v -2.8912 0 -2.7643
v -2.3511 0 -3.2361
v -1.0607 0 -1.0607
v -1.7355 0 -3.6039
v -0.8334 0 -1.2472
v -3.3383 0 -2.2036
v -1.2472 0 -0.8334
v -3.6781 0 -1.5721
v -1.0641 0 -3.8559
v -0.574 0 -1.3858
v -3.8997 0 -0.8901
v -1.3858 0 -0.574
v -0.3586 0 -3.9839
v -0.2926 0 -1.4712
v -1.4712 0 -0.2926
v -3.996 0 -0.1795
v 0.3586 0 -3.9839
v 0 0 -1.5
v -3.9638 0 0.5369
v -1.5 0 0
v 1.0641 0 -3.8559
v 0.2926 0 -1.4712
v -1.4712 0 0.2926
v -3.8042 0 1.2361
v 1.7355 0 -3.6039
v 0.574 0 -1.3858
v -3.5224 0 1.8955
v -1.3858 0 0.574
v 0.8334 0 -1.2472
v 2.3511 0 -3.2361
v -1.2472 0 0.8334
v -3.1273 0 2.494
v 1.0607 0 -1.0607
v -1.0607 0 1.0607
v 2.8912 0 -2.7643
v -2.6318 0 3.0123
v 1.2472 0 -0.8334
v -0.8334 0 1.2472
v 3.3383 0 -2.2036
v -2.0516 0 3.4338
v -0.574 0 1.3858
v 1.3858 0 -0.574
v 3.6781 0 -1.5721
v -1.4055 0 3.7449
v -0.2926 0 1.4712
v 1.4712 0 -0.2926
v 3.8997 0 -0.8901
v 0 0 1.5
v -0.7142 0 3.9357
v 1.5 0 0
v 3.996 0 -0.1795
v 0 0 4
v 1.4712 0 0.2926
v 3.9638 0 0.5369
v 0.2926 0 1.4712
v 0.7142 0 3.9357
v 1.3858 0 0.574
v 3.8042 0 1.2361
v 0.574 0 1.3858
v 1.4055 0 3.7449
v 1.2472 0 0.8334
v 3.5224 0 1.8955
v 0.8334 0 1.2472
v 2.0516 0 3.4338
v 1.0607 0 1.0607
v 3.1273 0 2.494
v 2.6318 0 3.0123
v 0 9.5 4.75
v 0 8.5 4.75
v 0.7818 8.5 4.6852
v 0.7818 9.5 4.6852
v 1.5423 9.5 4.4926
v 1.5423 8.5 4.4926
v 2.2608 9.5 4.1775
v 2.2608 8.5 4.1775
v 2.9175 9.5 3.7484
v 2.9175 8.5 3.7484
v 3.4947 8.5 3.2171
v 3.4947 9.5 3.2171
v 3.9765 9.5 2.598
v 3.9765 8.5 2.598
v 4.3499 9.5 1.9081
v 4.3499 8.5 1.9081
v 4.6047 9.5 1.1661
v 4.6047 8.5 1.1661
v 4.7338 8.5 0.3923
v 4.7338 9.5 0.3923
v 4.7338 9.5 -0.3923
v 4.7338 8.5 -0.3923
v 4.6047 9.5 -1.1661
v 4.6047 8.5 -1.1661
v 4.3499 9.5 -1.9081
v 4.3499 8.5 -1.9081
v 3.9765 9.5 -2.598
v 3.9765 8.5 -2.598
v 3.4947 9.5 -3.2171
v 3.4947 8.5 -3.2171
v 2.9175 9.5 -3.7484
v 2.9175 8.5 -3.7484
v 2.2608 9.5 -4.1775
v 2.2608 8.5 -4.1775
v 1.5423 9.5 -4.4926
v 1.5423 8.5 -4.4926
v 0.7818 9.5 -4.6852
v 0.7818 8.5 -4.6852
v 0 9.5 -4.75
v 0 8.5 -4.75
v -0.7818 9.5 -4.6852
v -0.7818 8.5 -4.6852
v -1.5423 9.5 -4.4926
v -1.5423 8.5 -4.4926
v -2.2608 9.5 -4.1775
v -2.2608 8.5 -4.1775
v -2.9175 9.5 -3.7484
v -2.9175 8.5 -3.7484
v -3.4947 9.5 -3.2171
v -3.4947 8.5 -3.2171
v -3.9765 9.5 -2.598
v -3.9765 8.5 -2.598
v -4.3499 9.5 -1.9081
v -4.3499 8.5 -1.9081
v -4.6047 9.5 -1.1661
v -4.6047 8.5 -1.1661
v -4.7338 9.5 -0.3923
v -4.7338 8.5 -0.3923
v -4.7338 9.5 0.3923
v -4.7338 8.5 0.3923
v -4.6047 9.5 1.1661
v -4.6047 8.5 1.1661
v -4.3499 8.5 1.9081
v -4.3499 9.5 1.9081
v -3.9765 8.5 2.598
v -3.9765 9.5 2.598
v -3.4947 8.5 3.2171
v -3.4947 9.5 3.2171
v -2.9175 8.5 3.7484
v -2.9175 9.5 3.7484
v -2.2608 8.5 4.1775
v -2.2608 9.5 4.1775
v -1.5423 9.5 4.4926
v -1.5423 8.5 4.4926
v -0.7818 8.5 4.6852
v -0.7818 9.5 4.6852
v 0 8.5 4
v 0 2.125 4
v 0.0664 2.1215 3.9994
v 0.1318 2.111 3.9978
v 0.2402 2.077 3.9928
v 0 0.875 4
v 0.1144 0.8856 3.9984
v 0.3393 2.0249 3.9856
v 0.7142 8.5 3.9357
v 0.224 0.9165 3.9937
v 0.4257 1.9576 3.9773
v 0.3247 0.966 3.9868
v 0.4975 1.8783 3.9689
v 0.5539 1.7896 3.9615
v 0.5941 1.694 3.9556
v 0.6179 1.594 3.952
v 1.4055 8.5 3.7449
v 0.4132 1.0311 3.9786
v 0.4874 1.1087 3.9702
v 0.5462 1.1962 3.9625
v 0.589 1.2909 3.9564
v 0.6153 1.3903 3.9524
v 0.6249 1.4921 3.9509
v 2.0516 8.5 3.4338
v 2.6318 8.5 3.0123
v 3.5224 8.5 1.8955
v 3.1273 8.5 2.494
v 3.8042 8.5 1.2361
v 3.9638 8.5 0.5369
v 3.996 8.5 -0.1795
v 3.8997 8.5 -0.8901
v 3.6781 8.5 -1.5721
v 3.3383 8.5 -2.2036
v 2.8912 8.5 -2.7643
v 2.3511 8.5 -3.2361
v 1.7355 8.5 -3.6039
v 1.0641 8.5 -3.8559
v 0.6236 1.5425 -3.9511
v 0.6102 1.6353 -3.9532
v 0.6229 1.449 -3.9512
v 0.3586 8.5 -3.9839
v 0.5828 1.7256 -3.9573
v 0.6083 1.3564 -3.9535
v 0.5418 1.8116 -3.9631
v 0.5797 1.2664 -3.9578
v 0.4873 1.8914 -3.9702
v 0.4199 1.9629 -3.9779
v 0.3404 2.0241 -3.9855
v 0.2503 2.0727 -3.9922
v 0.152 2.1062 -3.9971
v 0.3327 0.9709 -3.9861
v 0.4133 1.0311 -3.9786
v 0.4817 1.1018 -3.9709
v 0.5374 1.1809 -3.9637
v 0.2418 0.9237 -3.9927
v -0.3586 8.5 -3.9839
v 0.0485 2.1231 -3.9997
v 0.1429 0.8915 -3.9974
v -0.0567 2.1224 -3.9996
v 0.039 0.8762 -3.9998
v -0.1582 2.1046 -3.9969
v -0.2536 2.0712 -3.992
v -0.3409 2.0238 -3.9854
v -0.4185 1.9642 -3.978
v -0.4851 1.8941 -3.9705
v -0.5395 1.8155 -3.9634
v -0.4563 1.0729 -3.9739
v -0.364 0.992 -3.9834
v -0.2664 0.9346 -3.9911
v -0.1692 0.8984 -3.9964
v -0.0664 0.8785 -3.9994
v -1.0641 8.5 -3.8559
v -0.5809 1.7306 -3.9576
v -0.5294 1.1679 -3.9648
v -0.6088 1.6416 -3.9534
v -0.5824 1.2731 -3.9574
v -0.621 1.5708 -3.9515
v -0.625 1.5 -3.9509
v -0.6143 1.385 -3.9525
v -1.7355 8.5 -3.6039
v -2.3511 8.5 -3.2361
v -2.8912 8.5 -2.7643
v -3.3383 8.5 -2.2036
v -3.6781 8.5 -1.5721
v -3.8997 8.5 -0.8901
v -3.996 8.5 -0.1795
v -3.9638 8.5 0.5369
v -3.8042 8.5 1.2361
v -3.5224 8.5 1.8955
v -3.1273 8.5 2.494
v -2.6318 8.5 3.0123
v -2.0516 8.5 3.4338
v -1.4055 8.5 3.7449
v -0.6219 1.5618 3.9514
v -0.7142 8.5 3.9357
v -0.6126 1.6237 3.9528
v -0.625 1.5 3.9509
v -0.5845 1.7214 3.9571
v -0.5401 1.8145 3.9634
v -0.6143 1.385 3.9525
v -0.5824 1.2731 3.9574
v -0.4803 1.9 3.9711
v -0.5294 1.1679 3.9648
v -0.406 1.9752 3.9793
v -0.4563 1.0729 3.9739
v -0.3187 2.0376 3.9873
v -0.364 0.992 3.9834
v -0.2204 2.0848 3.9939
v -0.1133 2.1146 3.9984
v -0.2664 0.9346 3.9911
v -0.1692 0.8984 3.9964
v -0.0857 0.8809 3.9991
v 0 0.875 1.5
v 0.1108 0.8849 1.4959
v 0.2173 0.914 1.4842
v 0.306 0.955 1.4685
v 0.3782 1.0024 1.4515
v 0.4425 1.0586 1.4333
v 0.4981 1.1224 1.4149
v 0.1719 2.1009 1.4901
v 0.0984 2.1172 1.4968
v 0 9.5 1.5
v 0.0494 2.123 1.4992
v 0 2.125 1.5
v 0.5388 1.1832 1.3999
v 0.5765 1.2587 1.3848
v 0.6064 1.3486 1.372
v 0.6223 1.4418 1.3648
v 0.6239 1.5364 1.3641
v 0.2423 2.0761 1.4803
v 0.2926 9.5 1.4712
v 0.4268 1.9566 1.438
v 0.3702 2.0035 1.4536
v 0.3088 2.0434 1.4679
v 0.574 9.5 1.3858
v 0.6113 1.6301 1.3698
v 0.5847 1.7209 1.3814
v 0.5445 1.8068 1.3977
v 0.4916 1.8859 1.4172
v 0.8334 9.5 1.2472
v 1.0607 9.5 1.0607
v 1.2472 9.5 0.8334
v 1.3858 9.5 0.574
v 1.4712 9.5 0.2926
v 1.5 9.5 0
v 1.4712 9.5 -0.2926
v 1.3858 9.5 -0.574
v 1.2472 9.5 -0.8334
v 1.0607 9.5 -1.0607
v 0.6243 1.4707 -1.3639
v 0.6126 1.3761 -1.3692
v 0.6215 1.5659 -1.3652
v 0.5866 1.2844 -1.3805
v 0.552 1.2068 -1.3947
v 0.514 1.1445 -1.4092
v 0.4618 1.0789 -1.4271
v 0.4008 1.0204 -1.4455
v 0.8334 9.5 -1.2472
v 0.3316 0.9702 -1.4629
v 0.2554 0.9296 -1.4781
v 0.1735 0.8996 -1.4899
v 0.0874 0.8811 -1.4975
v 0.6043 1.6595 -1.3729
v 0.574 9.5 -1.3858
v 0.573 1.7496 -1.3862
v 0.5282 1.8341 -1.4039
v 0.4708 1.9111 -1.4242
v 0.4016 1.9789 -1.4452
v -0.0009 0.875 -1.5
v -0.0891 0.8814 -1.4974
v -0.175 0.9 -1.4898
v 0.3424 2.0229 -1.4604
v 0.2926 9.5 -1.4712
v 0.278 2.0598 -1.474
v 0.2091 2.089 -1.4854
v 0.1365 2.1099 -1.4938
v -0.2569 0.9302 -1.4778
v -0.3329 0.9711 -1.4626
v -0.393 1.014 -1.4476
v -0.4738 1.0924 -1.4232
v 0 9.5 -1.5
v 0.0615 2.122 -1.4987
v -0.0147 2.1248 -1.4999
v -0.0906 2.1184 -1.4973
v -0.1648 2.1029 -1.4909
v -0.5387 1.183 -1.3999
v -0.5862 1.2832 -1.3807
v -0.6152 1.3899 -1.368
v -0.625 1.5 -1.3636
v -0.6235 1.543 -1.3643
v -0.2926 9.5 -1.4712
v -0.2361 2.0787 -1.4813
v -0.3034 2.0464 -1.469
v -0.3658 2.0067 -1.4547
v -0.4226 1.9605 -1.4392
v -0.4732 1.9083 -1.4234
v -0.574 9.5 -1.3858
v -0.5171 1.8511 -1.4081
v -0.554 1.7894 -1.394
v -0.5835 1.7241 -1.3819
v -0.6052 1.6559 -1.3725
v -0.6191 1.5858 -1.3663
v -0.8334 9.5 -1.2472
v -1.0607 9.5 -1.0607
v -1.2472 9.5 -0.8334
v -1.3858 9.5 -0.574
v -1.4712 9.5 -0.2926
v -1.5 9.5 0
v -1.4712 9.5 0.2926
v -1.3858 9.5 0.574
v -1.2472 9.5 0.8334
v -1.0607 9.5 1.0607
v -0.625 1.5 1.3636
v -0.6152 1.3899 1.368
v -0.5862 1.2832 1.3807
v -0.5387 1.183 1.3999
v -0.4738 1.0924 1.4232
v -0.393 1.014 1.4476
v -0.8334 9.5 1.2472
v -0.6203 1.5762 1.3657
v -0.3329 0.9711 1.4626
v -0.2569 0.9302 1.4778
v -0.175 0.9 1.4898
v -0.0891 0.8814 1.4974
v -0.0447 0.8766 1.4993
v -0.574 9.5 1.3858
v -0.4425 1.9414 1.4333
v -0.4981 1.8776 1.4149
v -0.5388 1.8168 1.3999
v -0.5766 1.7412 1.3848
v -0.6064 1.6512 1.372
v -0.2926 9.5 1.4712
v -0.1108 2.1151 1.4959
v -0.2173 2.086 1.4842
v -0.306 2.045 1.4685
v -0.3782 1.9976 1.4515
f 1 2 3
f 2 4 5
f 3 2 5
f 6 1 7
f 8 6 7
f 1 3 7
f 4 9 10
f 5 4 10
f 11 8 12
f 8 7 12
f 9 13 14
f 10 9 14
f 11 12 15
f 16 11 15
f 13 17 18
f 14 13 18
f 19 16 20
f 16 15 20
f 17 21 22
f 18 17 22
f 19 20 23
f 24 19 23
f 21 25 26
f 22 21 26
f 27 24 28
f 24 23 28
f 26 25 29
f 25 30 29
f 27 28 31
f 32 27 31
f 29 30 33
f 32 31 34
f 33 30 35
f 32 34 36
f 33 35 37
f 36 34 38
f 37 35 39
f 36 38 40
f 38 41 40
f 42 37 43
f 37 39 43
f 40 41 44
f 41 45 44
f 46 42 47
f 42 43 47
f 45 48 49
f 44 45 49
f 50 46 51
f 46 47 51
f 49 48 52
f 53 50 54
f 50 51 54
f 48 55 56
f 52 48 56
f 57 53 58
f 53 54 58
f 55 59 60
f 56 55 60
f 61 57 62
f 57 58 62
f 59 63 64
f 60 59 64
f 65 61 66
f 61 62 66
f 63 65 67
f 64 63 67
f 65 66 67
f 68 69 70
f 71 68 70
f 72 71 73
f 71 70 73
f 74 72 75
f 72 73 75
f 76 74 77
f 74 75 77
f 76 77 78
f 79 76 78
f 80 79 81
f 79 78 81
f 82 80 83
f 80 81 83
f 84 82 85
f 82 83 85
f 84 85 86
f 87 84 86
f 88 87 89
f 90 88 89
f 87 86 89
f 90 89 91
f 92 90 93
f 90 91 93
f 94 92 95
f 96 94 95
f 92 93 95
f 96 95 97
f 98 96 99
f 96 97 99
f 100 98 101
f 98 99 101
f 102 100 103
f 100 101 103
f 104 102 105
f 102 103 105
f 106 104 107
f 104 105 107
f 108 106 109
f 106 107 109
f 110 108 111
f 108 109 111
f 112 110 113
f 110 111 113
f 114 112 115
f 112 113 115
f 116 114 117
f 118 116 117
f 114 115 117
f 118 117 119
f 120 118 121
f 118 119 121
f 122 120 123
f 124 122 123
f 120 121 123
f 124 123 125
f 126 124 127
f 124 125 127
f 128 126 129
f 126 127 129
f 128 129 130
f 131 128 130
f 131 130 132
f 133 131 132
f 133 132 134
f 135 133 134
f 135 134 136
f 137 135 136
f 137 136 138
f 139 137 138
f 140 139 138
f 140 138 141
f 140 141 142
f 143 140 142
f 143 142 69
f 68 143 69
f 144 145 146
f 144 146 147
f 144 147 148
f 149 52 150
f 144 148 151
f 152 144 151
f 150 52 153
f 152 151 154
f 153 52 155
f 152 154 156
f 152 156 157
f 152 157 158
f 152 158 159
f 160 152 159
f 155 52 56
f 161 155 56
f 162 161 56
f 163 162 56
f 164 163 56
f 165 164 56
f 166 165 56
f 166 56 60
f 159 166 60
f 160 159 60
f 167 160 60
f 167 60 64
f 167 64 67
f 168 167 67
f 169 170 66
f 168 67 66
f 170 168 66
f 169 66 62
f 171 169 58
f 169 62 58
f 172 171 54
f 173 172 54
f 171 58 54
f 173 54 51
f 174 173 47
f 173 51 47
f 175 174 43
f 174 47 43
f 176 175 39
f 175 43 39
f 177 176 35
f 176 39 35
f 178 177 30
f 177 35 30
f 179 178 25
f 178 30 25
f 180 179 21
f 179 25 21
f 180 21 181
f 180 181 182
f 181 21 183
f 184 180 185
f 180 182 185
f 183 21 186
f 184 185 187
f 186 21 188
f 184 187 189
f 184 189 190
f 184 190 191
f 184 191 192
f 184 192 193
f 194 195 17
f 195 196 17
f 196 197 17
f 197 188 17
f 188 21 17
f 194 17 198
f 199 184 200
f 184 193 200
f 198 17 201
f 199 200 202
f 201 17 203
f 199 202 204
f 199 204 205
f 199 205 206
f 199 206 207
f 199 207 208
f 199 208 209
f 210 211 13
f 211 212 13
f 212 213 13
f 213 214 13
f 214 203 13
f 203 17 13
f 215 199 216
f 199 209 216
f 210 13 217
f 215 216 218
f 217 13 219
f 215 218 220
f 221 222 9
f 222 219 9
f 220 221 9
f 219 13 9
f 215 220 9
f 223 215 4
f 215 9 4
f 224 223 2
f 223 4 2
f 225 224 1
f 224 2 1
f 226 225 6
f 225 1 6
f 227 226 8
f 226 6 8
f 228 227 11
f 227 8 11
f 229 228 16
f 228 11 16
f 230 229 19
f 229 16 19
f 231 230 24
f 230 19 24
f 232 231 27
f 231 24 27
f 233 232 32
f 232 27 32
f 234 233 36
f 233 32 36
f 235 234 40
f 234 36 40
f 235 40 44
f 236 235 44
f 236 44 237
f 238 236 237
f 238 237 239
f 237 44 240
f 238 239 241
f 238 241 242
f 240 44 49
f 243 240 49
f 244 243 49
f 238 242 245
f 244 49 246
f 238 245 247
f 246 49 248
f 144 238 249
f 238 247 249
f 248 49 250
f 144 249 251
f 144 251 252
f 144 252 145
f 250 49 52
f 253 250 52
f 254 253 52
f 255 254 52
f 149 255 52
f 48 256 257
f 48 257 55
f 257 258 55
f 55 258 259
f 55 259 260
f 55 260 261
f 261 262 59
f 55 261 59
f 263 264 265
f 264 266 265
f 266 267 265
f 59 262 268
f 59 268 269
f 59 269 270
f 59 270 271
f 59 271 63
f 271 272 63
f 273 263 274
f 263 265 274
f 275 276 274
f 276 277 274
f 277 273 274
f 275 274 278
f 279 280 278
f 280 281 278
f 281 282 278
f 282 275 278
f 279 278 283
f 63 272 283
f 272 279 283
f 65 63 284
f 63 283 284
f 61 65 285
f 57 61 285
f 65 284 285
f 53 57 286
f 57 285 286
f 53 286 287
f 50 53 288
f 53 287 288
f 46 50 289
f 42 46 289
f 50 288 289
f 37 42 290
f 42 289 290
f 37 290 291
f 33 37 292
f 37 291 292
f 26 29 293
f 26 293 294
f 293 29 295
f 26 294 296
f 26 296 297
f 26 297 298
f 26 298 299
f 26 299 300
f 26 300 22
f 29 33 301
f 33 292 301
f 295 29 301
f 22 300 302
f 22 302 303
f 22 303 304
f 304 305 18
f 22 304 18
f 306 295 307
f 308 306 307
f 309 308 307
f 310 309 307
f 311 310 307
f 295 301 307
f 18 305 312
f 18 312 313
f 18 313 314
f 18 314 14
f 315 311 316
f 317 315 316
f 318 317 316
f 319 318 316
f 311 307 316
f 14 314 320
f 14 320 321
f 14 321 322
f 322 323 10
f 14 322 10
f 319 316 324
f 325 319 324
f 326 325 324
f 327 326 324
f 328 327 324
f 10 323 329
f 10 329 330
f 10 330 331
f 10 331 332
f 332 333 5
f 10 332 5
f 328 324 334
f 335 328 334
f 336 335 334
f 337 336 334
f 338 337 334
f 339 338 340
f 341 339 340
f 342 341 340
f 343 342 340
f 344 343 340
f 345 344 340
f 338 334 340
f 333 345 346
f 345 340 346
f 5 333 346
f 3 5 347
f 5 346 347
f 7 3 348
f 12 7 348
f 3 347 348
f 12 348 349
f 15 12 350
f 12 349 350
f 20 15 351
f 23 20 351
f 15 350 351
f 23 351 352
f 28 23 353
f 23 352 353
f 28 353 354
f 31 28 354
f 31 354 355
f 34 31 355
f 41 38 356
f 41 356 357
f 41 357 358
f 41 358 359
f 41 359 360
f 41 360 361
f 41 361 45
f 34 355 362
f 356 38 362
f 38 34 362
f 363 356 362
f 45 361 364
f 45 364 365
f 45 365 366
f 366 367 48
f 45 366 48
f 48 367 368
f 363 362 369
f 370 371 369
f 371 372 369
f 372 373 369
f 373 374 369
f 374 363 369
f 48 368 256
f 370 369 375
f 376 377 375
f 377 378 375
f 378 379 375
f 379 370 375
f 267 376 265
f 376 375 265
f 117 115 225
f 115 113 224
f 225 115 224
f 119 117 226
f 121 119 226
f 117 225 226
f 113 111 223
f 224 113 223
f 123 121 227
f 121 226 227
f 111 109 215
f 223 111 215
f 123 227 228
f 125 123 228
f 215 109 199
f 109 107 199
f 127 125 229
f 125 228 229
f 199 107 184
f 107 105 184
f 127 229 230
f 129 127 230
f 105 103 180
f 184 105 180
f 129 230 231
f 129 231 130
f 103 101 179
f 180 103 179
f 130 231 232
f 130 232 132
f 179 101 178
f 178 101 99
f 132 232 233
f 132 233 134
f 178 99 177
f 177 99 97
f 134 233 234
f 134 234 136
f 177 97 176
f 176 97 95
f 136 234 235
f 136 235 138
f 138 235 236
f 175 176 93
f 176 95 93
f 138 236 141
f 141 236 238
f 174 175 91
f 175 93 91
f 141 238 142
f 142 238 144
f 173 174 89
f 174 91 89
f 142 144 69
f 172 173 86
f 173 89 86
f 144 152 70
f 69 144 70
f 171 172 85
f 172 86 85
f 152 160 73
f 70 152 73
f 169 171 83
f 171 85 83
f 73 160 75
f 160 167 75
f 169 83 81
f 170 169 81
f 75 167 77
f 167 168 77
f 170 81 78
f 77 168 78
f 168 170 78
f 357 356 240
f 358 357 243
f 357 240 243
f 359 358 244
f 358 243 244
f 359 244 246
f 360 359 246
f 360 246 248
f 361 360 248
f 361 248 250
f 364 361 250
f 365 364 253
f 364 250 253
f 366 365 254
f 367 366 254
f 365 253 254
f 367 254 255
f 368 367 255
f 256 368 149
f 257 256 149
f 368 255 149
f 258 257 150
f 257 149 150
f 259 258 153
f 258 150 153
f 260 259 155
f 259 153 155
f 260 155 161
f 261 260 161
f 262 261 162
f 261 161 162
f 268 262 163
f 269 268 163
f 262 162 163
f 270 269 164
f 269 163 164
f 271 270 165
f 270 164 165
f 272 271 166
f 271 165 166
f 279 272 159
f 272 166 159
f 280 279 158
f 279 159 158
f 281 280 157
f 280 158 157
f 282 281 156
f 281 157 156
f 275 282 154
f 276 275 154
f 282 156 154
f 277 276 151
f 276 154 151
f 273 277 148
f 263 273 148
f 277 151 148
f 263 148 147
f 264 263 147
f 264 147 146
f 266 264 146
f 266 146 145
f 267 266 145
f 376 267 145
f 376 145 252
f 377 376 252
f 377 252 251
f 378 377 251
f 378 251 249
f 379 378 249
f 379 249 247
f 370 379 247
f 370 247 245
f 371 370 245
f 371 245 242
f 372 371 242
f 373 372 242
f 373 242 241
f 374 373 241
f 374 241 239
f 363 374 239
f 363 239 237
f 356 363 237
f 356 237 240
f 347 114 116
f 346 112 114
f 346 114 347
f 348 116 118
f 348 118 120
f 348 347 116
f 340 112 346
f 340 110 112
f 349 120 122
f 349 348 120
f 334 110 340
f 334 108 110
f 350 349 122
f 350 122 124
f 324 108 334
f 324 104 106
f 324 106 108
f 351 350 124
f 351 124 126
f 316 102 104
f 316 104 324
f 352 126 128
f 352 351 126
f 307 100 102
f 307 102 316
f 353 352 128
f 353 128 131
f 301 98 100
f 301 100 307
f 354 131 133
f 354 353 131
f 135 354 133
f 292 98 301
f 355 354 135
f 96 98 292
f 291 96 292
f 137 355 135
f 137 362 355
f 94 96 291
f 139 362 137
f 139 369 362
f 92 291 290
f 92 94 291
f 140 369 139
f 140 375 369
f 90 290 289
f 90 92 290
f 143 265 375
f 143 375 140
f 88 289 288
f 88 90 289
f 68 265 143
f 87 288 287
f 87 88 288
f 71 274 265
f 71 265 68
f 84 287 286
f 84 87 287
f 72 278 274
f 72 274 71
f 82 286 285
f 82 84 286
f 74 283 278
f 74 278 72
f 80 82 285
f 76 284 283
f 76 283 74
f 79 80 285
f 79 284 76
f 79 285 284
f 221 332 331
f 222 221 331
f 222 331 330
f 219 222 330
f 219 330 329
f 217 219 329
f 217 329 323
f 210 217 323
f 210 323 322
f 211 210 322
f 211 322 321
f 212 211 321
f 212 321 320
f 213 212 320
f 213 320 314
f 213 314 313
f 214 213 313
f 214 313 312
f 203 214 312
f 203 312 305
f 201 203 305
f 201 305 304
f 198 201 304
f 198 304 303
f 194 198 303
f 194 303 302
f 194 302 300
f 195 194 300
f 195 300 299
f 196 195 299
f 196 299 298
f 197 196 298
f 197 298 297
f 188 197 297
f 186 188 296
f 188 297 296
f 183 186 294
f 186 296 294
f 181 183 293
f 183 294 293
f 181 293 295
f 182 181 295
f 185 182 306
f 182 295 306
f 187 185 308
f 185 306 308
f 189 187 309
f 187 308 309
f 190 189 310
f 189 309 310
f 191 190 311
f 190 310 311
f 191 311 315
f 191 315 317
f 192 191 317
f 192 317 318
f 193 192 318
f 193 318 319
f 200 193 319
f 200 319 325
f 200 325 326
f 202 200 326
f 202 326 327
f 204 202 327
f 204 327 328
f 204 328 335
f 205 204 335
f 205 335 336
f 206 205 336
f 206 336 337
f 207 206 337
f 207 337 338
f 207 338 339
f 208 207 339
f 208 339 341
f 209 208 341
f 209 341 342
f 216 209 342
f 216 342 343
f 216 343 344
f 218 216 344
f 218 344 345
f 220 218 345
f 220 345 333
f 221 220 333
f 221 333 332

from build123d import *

# Parameters (mm, degrees)
SKETCH1_R           = 4
BOSS_EXTRUDE1_DEPTH = 8.5
SKETCH2_R           = 4.75
BOSS_EXTRUDE2_DEPTH = 1
SKETCH8_R           = 1.5
CUT_EXTRUDE2_DEPTH  = 12.635076278
M1_6_TAPPED_HOLE4_D = 1.25


with BuildPart() as part:
    # Sketch1 → Boss-Extrude1 (new body)
    with BuildSketch(Plane(origin=(0, 0, 0), x_dir=(1, 0, 0), z_dir=(0, 1, 0))):
        with Locations(Location((0, 0, 0), (0, 0, 270))):
            Circle(SKETCH1_R)
    extrude(amount=BOSS_EXTRUDE1_DEPTH)

    # Sketch2 → Boss-Extrude2 (add)
    with BuildSketch(Plane(origin=(0, 8.5, 0), x_dir=(1, 0, 0), z_dir=(0, 1, 0))):
        with Locations(Location((0, 0, 0), (0, 0, 270))):
            Circle(SKETCH2_R)
    extrude(amount=BOSS_EXTRUDE2_DEPTH)

    # Sketch8 → Cut-Extrude2 (cut, through all)
    with BuildSketch(Plane(origin=(0, 9.5, 0), x_dir=(1, 0, 0), z_dir=(0, 1, 0))):
        with Locations(Location((0, 0, 0), (0, 0, 270))):
            Circle(SKETCH8_R)
    extrude(amount=-CUT_EXTRUDE2_DEPTH, mode=Mode.SUBTRACT)

    # M1.6 Tapped Hole4 (through all)
    with Locations(Plane(origin=(0, 0, -5), x_dir=(1, 0, 0), z_dir=(0, 0, -1))):
        with Locations((0, -1.5)):
            Hole(M1_6_TAPPED_HOLE4_D / 2)


solid = part.part
